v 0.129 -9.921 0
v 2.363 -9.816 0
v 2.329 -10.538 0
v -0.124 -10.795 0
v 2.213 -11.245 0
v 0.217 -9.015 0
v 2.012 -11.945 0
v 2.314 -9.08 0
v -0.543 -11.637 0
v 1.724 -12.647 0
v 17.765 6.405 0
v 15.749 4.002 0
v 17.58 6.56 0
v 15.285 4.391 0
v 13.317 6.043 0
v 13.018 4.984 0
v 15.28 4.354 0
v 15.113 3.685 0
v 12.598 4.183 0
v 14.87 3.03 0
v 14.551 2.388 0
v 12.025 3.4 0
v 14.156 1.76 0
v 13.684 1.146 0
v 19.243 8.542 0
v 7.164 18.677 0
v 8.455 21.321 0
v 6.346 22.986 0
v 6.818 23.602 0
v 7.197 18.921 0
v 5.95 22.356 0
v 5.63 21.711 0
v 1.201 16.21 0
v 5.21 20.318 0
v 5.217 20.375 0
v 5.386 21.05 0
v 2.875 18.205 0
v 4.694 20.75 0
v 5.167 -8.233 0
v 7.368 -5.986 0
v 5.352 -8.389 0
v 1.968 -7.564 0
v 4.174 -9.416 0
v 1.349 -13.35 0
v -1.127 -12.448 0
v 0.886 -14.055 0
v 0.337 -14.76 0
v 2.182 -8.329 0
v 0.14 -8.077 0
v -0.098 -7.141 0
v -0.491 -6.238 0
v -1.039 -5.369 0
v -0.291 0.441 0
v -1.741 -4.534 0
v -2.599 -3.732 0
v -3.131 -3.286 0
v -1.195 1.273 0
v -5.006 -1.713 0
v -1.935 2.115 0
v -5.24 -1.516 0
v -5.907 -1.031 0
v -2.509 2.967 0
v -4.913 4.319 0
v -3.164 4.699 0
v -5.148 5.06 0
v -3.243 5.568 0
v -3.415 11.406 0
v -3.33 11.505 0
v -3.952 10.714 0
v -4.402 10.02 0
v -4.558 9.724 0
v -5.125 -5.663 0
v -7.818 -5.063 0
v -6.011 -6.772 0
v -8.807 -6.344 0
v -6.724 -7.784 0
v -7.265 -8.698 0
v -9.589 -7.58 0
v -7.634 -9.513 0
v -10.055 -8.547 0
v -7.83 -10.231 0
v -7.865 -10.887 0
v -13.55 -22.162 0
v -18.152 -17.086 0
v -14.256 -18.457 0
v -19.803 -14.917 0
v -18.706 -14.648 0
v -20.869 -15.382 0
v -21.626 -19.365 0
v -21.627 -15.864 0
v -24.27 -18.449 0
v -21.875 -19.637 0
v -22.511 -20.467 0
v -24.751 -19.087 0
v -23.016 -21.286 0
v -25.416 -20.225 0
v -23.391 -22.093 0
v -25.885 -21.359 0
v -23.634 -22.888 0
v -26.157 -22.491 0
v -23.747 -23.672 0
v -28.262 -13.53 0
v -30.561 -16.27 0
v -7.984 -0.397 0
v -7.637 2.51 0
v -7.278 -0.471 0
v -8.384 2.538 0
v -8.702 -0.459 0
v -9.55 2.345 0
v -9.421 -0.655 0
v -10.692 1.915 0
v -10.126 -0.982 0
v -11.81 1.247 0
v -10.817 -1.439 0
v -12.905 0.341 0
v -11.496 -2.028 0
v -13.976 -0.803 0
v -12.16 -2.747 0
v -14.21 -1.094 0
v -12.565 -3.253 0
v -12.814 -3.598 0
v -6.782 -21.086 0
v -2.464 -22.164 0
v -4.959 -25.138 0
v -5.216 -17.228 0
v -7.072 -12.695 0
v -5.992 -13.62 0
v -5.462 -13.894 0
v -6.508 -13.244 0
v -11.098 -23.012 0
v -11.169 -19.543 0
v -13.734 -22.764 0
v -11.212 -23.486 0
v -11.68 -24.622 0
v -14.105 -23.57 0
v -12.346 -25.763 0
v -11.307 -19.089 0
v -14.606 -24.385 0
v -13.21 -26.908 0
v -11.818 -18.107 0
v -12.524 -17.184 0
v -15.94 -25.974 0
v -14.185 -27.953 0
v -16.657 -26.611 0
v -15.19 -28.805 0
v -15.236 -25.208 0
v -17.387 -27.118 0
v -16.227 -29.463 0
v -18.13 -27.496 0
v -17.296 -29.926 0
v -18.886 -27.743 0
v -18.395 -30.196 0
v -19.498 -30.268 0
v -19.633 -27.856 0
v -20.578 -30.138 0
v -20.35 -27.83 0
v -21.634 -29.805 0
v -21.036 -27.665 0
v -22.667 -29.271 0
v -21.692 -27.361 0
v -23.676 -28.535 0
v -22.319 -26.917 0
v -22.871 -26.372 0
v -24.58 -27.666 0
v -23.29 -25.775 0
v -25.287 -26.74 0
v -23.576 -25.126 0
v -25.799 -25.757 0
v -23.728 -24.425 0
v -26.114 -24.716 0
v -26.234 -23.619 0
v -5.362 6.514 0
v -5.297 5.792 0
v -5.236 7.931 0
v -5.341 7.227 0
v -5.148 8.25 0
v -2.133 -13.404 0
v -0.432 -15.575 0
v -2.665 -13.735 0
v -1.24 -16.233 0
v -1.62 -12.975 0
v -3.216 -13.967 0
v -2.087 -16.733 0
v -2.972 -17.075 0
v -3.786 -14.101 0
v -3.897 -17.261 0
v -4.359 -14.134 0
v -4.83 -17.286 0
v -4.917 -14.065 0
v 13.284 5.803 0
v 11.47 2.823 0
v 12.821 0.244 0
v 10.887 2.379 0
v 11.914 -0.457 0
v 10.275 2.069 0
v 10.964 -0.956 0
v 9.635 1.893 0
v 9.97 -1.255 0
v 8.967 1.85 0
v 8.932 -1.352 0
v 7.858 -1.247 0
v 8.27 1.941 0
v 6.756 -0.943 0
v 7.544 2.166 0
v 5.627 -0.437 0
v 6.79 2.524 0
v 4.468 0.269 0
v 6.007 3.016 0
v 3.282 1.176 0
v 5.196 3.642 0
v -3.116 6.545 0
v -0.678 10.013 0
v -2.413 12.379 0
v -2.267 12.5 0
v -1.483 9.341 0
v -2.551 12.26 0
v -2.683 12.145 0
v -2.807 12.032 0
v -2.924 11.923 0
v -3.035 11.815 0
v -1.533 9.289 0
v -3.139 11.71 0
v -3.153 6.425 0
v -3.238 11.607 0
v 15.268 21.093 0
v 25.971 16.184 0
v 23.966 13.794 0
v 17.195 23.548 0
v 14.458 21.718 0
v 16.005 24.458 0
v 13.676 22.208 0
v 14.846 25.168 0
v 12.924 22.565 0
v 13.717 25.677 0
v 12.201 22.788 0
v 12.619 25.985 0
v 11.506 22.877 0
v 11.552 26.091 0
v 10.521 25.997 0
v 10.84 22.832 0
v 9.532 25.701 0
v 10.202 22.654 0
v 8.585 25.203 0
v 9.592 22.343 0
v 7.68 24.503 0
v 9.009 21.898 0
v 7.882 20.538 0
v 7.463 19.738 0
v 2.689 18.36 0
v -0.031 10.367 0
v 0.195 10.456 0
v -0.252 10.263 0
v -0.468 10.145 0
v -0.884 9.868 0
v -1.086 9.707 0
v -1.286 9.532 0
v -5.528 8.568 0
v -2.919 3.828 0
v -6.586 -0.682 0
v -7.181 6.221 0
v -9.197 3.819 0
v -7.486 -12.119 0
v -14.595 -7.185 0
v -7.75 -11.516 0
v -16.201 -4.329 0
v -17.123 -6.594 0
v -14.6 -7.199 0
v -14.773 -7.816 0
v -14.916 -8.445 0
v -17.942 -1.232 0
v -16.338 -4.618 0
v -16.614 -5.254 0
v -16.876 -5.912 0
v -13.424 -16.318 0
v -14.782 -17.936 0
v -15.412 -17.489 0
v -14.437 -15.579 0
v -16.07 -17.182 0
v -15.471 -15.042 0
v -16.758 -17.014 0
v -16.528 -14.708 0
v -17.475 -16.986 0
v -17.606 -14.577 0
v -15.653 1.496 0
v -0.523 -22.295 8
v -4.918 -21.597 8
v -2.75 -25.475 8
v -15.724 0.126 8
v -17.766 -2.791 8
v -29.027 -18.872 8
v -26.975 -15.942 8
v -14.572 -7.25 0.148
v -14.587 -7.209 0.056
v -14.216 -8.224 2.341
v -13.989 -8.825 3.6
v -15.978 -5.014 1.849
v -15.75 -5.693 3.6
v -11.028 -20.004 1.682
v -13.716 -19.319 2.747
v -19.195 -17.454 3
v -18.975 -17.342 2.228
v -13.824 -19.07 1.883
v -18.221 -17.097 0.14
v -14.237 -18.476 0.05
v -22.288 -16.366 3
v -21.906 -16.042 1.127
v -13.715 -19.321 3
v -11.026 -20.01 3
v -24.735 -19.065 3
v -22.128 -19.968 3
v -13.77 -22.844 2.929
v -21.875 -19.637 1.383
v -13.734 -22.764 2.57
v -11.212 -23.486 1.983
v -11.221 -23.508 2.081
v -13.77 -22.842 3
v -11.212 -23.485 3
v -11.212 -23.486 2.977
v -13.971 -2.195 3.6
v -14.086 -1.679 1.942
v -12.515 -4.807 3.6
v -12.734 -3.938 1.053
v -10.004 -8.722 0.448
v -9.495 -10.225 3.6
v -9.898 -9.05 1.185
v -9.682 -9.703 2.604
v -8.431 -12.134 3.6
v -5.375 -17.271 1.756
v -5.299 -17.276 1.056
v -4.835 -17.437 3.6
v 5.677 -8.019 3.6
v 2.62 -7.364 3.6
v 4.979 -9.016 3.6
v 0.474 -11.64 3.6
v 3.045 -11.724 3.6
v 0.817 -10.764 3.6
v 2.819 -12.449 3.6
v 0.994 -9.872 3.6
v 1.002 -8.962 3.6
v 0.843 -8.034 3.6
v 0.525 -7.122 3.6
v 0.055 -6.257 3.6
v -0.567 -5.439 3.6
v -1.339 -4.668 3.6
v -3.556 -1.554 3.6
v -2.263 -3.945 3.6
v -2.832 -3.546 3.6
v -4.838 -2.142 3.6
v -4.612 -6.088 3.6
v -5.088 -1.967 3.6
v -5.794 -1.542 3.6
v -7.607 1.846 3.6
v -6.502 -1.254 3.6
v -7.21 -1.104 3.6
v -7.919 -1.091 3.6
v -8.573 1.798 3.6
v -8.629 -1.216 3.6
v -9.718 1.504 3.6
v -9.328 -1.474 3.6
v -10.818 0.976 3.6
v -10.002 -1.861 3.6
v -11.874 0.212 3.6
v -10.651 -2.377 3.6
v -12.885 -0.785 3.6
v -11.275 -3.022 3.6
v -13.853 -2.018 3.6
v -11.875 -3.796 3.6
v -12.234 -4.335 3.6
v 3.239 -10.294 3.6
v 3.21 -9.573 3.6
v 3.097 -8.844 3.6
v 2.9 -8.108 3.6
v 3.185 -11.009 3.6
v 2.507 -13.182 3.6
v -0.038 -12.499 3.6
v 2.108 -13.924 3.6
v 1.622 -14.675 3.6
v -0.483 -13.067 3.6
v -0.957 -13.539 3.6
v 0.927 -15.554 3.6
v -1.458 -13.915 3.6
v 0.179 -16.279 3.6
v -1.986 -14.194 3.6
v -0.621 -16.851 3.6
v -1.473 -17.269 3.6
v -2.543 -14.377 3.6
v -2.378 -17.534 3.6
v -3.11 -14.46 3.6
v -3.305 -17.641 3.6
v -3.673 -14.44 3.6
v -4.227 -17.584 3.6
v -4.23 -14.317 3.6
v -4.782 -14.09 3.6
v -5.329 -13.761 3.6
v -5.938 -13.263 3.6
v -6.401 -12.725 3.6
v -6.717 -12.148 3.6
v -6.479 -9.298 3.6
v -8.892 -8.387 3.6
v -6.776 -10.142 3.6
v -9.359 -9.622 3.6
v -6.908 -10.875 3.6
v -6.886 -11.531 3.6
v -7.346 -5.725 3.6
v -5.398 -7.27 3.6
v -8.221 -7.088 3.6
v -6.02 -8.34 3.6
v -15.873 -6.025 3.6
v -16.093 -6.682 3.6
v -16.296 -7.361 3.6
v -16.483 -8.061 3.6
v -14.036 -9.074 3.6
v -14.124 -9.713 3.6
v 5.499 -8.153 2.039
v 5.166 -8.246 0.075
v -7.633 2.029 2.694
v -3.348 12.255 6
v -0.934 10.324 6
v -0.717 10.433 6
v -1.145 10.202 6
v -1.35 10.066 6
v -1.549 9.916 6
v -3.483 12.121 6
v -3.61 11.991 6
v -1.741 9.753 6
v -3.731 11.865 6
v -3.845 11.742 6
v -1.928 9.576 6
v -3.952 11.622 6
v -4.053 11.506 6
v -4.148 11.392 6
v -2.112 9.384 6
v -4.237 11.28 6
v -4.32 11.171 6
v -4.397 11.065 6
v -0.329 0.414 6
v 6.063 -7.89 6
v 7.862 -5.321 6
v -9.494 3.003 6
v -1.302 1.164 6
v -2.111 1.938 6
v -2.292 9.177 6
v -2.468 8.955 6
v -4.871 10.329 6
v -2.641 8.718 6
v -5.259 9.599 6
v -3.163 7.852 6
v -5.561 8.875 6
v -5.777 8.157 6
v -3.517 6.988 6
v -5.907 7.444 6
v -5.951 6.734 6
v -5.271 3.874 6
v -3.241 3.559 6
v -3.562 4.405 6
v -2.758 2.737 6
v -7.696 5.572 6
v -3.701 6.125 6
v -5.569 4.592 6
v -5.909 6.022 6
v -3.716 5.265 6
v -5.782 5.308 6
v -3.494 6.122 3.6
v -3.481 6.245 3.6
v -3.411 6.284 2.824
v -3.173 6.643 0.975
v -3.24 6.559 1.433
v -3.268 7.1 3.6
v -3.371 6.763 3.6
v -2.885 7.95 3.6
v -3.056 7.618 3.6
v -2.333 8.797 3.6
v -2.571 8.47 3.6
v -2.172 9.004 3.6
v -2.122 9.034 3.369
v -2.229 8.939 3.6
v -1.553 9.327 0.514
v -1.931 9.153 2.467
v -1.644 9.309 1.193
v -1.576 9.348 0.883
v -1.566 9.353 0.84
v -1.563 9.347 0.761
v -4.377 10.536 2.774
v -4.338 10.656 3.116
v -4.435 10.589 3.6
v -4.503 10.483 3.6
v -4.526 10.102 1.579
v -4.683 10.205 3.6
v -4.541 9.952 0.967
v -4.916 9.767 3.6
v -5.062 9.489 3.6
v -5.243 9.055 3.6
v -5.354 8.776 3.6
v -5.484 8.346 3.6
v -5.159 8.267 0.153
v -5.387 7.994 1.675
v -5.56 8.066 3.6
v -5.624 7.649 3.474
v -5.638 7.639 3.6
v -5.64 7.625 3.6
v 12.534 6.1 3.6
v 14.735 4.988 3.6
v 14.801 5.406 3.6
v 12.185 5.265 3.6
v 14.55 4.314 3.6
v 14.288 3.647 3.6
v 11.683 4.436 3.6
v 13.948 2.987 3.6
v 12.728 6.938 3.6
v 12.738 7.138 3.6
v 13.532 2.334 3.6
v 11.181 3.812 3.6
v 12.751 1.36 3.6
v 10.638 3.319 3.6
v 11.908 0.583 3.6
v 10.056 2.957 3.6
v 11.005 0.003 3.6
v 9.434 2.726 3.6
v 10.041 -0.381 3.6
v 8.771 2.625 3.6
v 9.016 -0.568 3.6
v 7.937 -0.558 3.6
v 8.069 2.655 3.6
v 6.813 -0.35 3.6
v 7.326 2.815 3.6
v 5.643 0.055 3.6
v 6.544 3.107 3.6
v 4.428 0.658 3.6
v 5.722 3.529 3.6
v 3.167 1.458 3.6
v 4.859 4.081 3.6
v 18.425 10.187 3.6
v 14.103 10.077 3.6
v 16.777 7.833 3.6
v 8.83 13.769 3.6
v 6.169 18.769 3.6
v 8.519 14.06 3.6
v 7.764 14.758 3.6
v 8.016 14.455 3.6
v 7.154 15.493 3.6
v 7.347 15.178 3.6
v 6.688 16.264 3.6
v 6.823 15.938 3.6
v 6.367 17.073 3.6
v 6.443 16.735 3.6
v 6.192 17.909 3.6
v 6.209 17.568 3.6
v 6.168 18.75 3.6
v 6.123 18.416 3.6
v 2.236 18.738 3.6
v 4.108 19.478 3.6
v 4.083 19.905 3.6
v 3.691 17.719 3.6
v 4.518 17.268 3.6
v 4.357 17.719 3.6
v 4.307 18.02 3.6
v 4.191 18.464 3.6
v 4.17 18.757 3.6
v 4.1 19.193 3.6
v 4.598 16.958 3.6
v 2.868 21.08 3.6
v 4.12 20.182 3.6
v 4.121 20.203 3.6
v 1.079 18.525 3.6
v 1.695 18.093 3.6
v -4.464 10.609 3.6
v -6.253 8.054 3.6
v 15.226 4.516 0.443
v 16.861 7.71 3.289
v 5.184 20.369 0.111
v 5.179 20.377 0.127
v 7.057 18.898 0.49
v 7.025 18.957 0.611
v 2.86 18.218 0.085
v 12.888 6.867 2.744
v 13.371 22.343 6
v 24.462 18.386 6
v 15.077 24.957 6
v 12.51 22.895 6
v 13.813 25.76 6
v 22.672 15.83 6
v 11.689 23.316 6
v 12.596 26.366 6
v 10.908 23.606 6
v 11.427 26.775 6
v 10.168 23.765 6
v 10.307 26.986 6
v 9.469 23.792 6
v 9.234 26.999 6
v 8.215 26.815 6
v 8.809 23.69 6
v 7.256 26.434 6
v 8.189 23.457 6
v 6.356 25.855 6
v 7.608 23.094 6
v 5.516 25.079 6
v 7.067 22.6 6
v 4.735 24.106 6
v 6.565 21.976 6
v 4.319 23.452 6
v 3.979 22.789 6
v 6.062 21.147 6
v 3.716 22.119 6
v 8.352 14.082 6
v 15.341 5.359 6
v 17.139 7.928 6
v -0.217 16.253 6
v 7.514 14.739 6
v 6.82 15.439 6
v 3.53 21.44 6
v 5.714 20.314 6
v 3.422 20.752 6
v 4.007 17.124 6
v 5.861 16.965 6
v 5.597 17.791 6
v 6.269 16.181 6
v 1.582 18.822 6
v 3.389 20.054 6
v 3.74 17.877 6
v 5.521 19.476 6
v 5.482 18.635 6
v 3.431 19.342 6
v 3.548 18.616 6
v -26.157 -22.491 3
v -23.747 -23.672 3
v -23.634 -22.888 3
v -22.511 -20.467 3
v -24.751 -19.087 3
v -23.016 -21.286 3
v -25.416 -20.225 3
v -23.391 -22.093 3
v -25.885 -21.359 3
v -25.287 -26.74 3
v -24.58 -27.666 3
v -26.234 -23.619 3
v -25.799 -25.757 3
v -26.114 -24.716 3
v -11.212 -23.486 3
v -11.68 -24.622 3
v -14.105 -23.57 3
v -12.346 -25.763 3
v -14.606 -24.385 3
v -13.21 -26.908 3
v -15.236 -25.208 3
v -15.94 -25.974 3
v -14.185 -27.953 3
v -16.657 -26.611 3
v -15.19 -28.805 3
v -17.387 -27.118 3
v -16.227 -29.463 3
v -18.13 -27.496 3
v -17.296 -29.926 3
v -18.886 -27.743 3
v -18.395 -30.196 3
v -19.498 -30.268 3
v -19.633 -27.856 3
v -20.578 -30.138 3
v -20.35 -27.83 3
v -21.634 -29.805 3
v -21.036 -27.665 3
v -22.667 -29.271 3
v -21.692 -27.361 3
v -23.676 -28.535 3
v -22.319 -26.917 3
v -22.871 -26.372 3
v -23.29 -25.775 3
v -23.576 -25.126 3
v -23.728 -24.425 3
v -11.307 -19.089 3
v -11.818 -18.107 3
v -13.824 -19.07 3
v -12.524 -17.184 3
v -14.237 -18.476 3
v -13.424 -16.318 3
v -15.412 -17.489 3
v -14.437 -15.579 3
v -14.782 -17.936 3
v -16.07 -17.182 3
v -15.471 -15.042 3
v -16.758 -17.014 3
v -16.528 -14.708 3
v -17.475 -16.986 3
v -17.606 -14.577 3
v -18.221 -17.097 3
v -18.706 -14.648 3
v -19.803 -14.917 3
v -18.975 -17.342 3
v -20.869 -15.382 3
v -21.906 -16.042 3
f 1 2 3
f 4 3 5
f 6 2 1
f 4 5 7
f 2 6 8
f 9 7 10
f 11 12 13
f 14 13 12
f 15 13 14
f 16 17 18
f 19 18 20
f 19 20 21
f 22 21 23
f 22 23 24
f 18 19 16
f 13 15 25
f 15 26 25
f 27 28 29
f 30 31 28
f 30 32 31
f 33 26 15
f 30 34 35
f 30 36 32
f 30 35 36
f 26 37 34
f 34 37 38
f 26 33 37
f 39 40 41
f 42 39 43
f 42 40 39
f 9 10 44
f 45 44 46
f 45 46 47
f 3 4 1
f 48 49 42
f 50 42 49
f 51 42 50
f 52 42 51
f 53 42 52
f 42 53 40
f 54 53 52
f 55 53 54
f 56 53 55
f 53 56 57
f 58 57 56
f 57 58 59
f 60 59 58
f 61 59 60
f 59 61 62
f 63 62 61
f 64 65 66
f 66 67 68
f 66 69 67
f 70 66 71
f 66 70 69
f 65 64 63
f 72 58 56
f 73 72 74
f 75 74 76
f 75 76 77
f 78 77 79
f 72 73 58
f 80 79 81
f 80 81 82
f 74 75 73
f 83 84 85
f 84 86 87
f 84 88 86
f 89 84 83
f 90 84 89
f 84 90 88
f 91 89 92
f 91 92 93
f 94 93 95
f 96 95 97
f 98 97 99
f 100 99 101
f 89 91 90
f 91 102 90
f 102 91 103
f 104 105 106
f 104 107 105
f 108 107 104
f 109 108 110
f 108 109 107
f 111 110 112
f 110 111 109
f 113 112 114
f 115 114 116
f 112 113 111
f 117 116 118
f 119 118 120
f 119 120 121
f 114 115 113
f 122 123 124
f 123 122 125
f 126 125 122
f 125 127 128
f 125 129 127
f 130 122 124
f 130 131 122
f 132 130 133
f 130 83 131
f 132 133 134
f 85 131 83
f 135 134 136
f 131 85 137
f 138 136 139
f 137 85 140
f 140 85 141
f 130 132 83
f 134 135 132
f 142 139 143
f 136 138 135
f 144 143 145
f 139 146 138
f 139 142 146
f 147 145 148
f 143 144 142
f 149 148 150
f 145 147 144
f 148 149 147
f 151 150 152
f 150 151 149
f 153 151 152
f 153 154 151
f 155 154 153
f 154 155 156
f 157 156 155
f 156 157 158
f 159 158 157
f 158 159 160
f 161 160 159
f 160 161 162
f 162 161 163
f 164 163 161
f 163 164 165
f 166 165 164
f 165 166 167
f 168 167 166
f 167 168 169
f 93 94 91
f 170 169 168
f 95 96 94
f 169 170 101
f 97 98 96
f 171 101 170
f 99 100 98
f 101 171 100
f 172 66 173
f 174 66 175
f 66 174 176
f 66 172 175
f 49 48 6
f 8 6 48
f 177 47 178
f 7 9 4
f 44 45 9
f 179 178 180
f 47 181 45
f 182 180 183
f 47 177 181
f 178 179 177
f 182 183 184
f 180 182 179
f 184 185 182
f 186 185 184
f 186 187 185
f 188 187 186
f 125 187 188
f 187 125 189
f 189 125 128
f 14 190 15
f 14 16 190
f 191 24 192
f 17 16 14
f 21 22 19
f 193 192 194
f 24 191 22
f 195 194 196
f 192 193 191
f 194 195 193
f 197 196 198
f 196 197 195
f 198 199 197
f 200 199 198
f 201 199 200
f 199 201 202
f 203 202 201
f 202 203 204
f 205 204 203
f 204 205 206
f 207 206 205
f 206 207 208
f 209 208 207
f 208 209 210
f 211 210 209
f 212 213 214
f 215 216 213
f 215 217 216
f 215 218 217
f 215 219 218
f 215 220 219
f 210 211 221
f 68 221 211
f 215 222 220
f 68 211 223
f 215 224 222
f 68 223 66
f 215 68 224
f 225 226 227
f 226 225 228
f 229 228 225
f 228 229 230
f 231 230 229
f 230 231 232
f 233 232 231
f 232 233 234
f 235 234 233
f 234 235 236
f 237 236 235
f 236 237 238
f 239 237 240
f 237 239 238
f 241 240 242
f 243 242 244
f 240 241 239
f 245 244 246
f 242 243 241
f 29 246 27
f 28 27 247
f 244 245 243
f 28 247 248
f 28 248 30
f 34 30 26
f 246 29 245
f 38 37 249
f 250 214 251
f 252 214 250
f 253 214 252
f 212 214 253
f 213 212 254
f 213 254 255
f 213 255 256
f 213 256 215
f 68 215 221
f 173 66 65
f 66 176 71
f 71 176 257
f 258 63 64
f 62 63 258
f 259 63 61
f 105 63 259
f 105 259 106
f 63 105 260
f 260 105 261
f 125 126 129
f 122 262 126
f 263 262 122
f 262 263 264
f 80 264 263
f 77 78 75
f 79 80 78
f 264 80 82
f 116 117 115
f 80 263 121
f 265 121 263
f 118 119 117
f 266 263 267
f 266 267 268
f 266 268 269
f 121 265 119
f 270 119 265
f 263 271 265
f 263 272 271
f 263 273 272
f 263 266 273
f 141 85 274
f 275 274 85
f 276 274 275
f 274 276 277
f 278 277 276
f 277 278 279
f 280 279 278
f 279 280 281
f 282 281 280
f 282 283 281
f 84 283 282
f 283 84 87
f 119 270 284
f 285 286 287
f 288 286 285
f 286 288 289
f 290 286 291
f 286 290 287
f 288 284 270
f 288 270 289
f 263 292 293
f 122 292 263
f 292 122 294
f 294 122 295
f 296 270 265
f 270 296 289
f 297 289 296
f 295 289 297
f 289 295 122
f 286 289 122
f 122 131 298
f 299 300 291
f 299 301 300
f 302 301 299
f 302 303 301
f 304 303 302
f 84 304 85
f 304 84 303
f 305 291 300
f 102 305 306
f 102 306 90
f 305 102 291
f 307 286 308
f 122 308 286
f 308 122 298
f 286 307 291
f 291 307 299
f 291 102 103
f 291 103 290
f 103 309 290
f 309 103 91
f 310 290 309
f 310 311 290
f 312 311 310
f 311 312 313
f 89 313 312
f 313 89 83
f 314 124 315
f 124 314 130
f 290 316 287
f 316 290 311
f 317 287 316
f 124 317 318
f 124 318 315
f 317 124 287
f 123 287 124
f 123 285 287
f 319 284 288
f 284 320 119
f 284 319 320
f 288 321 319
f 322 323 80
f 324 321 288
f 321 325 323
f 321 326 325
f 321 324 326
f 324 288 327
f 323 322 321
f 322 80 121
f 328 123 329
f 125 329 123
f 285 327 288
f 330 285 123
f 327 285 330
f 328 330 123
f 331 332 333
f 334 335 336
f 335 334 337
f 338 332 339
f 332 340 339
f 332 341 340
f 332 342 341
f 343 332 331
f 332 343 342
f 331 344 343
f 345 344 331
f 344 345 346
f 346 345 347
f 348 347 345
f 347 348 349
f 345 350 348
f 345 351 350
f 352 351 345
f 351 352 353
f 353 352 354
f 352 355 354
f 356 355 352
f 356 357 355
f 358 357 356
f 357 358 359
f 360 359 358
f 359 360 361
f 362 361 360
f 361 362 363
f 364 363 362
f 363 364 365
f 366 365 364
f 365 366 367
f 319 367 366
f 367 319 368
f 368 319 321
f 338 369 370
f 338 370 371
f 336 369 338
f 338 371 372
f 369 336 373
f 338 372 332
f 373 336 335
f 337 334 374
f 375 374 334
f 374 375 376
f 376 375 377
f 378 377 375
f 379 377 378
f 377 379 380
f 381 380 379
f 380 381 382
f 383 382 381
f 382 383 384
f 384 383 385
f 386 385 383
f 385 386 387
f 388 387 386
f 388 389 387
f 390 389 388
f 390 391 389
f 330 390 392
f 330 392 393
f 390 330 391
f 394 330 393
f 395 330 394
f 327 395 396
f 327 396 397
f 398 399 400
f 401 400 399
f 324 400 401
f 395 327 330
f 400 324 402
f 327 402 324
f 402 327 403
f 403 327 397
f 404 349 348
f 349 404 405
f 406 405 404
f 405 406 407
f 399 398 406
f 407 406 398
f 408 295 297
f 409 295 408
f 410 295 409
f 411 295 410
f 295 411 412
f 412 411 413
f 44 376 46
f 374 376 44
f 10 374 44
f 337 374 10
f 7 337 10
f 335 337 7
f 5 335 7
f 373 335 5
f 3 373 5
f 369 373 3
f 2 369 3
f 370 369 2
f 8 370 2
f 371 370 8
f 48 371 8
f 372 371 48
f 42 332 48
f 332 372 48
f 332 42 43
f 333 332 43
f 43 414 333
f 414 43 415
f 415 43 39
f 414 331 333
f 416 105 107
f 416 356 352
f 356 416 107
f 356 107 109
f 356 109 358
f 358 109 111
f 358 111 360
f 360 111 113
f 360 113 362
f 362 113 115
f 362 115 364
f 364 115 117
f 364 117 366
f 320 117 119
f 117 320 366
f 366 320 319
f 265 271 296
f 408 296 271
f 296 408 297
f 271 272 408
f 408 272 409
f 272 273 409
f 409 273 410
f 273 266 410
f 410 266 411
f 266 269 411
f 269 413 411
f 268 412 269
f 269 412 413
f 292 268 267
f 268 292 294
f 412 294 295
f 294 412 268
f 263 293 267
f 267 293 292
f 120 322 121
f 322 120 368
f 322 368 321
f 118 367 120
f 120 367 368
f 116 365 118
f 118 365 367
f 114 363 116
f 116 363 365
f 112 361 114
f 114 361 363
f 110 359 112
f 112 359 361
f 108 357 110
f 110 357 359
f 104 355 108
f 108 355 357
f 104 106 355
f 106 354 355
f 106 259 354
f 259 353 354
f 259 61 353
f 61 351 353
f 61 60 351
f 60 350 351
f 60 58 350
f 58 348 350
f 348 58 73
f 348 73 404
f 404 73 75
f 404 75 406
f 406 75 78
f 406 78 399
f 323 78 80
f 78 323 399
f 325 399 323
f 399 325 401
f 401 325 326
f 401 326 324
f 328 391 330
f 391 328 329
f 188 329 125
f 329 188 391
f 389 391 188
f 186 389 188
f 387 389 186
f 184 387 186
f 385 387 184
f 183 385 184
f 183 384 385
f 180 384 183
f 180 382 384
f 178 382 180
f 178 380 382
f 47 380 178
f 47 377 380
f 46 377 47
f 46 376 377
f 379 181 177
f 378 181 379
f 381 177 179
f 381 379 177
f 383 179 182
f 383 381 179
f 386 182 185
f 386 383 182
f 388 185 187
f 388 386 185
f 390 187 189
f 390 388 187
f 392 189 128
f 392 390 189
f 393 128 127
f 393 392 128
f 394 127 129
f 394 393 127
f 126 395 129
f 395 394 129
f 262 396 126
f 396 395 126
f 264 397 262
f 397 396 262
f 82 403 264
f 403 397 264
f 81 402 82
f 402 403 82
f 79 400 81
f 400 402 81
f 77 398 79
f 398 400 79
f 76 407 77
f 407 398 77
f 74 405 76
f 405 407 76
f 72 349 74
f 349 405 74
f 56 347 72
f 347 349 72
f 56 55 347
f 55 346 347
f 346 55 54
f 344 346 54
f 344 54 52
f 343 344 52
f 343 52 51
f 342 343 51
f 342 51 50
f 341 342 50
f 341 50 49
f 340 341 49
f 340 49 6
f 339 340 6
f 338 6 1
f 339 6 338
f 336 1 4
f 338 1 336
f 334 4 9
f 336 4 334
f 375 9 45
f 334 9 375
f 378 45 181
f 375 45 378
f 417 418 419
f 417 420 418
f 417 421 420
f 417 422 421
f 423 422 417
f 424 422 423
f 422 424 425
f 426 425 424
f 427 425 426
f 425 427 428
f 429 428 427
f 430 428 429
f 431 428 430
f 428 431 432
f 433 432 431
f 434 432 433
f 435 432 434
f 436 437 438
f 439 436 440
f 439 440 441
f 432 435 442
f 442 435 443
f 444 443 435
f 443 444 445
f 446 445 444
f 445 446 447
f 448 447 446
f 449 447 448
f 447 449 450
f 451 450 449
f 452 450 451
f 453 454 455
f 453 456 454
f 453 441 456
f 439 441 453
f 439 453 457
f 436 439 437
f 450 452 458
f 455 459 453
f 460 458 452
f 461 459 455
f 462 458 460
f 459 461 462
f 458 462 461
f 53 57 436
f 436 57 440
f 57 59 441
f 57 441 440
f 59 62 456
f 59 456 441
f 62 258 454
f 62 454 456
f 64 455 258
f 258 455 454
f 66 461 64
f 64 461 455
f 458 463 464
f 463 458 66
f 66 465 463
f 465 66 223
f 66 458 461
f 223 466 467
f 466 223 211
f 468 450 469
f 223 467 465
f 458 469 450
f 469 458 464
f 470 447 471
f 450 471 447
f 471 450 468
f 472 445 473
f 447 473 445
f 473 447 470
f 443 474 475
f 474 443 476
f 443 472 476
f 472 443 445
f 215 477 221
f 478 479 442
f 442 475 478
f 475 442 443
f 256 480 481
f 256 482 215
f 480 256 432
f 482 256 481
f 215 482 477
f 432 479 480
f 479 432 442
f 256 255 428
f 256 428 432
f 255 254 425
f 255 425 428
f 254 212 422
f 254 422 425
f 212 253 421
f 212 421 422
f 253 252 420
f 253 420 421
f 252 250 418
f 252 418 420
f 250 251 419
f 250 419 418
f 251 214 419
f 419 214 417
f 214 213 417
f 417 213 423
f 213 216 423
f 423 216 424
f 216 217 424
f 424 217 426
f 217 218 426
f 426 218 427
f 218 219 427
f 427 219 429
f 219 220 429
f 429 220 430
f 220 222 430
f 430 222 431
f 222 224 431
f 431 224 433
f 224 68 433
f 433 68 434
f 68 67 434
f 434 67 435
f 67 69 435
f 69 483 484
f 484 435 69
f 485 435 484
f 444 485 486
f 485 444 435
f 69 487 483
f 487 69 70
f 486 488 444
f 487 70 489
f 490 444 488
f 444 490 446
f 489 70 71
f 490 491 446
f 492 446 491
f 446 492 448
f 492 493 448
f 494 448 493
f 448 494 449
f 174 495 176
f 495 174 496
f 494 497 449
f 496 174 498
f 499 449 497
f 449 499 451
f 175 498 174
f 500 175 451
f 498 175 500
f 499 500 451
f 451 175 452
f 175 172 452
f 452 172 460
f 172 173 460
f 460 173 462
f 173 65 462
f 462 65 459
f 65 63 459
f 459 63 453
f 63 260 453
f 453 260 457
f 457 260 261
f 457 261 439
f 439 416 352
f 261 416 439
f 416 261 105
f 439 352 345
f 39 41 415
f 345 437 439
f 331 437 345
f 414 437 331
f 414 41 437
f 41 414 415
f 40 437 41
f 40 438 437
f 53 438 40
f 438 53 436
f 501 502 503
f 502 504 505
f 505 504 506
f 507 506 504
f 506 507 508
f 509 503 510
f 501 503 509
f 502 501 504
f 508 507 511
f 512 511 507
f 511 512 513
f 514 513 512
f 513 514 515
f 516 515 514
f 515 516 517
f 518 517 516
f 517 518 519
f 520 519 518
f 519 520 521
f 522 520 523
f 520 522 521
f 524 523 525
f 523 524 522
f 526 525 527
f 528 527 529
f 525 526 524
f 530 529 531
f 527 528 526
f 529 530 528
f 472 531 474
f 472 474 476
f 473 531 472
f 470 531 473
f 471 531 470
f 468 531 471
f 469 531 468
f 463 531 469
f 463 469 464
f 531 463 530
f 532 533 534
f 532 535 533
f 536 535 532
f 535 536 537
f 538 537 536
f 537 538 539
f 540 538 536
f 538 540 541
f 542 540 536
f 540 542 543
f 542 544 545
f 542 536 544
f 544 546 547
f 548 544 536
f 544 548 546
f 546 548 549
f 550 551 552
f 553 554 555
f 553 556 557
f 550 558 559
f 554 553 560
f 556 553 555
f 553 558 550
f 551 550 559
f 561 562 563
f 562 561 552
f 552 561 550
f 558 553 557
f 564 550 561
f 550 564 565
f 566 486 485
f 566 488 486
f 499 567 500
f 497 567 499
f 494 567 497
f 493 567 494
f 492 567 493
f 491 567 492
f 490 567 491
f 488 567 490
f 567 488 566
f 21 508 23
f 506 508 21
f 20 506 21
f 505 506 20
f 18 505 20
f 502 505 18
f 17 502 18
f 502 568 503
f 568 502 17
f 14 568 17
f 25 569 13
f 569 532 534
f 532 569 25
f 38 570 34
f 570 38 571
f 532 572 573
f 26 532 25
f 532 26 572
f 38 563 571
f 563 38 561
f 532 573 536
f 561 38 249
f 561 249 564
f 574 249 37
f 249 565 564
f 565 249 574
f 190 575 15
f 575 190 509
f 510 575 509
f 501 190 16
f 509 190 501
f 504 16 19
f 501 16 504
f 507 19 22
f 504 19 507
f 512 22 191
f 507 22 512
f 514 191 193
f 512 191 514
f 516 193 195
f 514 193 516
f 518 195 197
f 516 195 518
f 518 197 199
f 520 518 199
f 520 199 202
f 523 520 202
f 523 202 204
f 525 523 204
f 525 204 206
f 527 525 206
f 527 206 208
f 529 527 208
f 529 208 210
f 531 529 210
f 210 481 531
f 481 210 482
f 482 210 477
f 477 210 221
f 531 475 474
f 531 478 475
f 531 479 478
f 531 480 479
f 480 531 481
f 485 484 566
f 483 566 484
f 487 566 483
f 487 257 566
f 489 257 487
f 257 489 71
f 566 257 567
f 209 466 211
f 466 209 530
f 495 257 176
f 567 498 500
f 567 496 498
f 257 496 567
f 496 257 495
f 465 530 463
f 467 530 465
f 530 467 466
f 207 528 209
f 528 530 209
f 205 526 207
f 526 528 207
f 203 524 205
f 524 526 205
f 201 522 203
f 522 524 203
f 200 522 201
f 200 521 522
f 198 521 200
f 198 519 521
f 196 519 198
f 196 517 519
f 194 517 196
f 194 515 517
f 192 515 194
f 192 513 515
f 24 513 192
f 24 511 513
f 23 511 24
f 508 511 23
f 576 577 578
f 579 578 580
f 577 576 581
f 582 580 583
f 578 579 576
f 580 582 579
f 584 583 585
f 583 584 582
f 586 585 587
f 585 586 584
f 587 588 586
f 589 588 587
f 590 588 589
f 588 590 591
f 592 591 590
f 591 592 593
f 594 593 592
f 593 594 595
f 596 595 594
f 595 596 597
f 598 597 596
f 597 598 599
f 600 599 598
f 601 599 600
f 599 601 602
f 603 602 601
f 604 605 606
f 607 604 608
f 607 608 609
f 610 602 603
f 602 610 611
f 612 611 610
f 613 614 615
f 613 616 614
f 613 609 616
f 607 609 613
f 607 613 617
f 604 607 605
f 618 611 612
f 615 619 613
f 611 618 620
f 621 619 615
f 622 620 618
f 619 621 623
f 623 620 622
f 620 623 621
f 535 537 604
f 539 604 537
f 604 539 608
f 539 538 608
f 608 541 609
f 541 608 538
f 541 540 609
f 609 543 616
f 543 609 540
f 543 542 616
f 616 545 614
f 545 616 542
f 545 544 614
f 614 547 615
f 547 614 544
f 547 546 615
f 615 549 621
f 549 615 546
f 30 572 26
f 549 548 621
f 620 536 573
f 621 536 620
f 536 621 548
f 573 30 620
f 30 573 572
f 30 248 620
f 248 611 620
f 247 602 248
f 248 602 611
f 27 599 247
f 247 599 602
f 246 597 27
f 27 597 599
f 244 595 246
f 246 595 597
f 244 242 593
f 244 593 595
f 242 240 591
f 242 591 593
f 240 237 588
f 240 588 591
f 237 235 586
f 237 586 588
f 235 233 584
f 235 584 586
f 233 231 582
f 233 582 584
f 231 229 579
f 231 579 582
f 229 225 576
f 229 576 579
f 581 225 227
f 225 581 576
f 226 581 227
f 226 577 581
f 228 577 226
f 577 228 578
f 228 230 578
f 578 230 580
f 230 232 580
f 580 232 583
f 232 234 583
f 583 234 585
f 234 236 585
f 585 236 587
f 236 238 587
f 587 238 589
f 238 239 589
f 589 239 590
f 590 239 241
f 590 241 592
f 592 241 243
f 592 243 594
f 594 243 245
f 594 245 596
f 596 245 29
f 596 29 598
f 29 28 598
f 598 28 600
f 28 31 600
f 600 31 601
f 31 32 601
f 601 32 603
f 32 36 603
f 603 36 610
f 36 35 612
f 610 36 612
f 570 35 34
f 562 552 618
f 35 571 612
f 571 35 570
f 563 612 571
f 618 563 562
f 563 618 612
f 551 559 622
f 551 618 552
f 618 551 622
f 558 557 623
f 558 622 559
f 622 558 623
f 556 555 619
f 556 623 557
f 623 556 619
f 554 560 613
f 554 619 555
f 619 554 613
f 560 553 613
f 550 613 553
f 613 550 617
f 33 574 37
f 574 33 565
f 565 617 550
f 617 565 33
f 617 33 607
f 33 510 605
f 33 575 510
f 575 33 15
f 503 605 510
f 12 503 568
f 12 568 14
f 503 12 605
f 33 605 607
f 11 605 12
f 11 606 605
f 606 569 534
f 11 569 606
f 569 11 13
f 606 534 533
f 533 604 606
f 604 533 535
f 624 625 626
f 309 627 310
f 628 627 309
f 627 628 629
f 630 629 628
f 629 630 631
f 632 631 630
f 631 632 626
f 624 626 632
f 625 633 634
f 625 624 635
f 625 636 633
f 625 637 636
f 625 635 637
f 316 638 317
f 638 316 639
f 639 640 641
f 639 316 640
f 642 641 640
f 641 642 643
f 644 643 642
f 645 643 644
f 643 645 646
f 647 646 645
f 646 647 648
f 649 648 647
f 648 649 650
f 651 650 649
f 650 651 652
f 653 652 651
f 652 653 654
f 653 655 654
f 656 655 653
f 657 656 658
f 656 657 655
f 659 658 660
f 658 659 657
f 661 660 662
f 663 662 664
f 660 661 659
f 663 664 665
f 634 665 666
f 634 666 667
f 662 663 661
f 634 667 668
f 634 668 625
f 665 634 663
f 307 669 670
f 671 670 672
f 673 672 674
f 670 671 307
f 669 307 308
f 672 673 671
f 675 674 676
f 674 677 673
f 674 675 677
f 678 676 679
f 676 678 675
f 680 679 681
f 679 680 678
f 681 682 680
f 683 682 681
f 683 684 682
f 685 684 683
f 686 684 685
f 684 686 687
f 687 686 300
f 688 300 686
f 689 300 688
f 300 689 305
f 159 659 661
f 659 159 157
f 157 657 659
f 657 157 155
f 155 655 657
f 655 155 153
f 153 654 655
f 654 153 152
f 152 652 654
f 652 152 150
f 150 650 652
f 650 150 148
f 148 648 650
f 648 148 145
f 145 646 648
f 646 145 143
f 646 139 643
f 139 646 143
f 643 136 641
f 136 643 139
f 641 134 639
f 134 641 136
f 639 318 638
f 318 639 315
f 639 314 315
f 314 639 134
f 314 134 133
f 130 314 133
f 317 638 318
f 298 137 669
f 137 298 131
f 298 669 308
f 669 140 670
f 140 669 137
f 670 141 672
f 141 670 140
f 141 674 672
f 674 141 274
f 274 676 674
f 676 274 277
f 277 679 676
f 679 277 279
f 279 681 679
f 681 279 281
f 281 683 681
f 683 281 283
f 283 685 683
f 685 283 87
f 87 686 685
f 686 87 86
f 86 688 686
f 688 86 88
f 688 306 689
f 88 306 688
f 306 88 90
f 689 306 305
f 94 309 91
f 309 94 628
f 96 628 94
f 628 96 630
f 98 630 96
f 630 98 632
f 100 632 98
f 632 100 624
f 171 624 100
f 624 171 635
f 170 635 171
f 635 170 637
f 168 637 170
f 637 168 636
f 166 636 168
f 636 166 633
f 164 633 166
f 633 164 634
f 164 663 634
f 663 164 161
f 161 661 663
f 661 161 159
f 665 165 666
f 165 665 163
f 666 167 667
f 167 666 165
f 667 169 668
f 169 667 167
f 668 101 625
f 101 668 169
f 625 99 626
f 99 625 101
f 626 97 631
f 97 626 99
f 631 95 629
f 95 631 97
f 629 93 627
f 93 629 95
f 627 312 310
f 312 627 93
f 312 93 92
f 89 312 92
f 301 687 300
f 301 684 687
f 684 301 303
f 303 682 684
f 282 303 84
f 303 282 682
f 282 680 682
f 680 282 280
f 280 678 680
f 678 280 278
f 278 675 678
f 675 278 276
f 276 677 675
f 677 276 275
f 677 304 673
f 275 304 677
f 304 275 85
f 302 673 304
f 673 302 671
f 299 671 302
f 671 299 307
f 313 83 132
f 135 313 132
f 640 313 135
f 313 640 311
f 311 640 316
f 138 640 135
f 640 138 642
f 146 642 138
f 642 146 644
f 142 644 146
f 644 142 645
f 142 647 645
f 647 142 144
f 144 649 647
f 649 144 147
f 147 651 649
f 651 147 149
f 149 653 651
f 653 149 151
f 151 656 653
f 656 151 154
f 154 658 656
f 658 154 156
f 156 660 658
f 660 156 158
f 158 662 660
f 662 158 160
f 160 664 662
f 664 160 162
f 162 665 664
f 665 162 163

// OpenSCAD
Font_name = "Chewy";
Text = "Varun";
Rotation = 50;
Connect_dots = true;
Dot_bridge_height_percent = 40;

function char_w(c) = 
    (c == "m" || c == "w") ? 15.0 :
    (c == "i" || c == "l" || c == "j" || c == "t" || c == "f") ? 7.5 :
    (c >= "A" && c <= "Z") ? 14.0 :
    10.5;

function get_step_at(text, i) = 
    (i <= 0) ? 0 :
    ((char_w(text[i-1]) + char_w(text[i])) / 2 * 0.95);

function get_char_x_auto(text, i) = 
    (i <= 0) ? 0 : (get_char_x_auto(text, i - 1) + get_step_at(text, i));

span = get_char_x_auto(Text, len(Text)-1);
cx = span / 2;
loop_x = -cx - 8.5;
loop_y = 0;
twist = -5;
$fn = 32;

rotate([0, 0, Rotation]) {
    union() {
        // Loop
        color("DimGray")
        linear_extrude(height = 3, $fn = $fn)
            translate([loop_x, loop_y, 0]) rotate([0, 0, -90])
                text(size = 20, text = "o", font = Font_name, halign = "center", valign = "center", $fn = $fn);

        // Letters
        for (i = [0 : len(Text) - 1]) {
            h = (i == 0) ? 8.0 : ((i % 2 == 0) ? 6.0 : 3.6);
            char = Text[i];
            char_x = get_char_x_auto(Text, i) - cx;

            color([0.92, 0.72, 0.1]) {
                // Main letter extrusion (full height h)
                linear_extrude(height = h, twist = twist, $fn = $fn)
                    translate([char_x, 0, 0])
                        text(size = 25, text = char, font = Font_name, halign = "center", valign = "center", $fn = $fn);

                // Recessed bridge at 40% height (retains strength, preserves top surface aesthetics)
                if (Connect_dots) {
                    bridge_factor = Dot_bridge_height_percent / 100;
                    bridge_h = h * bridge_factor;
                    bridge_twist = twist * bridge_factor;
                    if (char == "i") {
                        linear_extrude(height = bridge_h, twist = bridge_twist, $fn = $fn)
                            translate([char_x, 0, 0])
                                translate([-1.2, 6.5]) square([2.4, 4.0]);
                    }
                    if (char == "j") {
                        linear_extrude(height = bridge_h, twist = bridge_twist, $fn = $fn)
                            translate([char_x, 0, 0])
                                translate([-1.2, 11.0]) square([2.4, 4.0]);
                    }
                }
            }
        }
    }
}
